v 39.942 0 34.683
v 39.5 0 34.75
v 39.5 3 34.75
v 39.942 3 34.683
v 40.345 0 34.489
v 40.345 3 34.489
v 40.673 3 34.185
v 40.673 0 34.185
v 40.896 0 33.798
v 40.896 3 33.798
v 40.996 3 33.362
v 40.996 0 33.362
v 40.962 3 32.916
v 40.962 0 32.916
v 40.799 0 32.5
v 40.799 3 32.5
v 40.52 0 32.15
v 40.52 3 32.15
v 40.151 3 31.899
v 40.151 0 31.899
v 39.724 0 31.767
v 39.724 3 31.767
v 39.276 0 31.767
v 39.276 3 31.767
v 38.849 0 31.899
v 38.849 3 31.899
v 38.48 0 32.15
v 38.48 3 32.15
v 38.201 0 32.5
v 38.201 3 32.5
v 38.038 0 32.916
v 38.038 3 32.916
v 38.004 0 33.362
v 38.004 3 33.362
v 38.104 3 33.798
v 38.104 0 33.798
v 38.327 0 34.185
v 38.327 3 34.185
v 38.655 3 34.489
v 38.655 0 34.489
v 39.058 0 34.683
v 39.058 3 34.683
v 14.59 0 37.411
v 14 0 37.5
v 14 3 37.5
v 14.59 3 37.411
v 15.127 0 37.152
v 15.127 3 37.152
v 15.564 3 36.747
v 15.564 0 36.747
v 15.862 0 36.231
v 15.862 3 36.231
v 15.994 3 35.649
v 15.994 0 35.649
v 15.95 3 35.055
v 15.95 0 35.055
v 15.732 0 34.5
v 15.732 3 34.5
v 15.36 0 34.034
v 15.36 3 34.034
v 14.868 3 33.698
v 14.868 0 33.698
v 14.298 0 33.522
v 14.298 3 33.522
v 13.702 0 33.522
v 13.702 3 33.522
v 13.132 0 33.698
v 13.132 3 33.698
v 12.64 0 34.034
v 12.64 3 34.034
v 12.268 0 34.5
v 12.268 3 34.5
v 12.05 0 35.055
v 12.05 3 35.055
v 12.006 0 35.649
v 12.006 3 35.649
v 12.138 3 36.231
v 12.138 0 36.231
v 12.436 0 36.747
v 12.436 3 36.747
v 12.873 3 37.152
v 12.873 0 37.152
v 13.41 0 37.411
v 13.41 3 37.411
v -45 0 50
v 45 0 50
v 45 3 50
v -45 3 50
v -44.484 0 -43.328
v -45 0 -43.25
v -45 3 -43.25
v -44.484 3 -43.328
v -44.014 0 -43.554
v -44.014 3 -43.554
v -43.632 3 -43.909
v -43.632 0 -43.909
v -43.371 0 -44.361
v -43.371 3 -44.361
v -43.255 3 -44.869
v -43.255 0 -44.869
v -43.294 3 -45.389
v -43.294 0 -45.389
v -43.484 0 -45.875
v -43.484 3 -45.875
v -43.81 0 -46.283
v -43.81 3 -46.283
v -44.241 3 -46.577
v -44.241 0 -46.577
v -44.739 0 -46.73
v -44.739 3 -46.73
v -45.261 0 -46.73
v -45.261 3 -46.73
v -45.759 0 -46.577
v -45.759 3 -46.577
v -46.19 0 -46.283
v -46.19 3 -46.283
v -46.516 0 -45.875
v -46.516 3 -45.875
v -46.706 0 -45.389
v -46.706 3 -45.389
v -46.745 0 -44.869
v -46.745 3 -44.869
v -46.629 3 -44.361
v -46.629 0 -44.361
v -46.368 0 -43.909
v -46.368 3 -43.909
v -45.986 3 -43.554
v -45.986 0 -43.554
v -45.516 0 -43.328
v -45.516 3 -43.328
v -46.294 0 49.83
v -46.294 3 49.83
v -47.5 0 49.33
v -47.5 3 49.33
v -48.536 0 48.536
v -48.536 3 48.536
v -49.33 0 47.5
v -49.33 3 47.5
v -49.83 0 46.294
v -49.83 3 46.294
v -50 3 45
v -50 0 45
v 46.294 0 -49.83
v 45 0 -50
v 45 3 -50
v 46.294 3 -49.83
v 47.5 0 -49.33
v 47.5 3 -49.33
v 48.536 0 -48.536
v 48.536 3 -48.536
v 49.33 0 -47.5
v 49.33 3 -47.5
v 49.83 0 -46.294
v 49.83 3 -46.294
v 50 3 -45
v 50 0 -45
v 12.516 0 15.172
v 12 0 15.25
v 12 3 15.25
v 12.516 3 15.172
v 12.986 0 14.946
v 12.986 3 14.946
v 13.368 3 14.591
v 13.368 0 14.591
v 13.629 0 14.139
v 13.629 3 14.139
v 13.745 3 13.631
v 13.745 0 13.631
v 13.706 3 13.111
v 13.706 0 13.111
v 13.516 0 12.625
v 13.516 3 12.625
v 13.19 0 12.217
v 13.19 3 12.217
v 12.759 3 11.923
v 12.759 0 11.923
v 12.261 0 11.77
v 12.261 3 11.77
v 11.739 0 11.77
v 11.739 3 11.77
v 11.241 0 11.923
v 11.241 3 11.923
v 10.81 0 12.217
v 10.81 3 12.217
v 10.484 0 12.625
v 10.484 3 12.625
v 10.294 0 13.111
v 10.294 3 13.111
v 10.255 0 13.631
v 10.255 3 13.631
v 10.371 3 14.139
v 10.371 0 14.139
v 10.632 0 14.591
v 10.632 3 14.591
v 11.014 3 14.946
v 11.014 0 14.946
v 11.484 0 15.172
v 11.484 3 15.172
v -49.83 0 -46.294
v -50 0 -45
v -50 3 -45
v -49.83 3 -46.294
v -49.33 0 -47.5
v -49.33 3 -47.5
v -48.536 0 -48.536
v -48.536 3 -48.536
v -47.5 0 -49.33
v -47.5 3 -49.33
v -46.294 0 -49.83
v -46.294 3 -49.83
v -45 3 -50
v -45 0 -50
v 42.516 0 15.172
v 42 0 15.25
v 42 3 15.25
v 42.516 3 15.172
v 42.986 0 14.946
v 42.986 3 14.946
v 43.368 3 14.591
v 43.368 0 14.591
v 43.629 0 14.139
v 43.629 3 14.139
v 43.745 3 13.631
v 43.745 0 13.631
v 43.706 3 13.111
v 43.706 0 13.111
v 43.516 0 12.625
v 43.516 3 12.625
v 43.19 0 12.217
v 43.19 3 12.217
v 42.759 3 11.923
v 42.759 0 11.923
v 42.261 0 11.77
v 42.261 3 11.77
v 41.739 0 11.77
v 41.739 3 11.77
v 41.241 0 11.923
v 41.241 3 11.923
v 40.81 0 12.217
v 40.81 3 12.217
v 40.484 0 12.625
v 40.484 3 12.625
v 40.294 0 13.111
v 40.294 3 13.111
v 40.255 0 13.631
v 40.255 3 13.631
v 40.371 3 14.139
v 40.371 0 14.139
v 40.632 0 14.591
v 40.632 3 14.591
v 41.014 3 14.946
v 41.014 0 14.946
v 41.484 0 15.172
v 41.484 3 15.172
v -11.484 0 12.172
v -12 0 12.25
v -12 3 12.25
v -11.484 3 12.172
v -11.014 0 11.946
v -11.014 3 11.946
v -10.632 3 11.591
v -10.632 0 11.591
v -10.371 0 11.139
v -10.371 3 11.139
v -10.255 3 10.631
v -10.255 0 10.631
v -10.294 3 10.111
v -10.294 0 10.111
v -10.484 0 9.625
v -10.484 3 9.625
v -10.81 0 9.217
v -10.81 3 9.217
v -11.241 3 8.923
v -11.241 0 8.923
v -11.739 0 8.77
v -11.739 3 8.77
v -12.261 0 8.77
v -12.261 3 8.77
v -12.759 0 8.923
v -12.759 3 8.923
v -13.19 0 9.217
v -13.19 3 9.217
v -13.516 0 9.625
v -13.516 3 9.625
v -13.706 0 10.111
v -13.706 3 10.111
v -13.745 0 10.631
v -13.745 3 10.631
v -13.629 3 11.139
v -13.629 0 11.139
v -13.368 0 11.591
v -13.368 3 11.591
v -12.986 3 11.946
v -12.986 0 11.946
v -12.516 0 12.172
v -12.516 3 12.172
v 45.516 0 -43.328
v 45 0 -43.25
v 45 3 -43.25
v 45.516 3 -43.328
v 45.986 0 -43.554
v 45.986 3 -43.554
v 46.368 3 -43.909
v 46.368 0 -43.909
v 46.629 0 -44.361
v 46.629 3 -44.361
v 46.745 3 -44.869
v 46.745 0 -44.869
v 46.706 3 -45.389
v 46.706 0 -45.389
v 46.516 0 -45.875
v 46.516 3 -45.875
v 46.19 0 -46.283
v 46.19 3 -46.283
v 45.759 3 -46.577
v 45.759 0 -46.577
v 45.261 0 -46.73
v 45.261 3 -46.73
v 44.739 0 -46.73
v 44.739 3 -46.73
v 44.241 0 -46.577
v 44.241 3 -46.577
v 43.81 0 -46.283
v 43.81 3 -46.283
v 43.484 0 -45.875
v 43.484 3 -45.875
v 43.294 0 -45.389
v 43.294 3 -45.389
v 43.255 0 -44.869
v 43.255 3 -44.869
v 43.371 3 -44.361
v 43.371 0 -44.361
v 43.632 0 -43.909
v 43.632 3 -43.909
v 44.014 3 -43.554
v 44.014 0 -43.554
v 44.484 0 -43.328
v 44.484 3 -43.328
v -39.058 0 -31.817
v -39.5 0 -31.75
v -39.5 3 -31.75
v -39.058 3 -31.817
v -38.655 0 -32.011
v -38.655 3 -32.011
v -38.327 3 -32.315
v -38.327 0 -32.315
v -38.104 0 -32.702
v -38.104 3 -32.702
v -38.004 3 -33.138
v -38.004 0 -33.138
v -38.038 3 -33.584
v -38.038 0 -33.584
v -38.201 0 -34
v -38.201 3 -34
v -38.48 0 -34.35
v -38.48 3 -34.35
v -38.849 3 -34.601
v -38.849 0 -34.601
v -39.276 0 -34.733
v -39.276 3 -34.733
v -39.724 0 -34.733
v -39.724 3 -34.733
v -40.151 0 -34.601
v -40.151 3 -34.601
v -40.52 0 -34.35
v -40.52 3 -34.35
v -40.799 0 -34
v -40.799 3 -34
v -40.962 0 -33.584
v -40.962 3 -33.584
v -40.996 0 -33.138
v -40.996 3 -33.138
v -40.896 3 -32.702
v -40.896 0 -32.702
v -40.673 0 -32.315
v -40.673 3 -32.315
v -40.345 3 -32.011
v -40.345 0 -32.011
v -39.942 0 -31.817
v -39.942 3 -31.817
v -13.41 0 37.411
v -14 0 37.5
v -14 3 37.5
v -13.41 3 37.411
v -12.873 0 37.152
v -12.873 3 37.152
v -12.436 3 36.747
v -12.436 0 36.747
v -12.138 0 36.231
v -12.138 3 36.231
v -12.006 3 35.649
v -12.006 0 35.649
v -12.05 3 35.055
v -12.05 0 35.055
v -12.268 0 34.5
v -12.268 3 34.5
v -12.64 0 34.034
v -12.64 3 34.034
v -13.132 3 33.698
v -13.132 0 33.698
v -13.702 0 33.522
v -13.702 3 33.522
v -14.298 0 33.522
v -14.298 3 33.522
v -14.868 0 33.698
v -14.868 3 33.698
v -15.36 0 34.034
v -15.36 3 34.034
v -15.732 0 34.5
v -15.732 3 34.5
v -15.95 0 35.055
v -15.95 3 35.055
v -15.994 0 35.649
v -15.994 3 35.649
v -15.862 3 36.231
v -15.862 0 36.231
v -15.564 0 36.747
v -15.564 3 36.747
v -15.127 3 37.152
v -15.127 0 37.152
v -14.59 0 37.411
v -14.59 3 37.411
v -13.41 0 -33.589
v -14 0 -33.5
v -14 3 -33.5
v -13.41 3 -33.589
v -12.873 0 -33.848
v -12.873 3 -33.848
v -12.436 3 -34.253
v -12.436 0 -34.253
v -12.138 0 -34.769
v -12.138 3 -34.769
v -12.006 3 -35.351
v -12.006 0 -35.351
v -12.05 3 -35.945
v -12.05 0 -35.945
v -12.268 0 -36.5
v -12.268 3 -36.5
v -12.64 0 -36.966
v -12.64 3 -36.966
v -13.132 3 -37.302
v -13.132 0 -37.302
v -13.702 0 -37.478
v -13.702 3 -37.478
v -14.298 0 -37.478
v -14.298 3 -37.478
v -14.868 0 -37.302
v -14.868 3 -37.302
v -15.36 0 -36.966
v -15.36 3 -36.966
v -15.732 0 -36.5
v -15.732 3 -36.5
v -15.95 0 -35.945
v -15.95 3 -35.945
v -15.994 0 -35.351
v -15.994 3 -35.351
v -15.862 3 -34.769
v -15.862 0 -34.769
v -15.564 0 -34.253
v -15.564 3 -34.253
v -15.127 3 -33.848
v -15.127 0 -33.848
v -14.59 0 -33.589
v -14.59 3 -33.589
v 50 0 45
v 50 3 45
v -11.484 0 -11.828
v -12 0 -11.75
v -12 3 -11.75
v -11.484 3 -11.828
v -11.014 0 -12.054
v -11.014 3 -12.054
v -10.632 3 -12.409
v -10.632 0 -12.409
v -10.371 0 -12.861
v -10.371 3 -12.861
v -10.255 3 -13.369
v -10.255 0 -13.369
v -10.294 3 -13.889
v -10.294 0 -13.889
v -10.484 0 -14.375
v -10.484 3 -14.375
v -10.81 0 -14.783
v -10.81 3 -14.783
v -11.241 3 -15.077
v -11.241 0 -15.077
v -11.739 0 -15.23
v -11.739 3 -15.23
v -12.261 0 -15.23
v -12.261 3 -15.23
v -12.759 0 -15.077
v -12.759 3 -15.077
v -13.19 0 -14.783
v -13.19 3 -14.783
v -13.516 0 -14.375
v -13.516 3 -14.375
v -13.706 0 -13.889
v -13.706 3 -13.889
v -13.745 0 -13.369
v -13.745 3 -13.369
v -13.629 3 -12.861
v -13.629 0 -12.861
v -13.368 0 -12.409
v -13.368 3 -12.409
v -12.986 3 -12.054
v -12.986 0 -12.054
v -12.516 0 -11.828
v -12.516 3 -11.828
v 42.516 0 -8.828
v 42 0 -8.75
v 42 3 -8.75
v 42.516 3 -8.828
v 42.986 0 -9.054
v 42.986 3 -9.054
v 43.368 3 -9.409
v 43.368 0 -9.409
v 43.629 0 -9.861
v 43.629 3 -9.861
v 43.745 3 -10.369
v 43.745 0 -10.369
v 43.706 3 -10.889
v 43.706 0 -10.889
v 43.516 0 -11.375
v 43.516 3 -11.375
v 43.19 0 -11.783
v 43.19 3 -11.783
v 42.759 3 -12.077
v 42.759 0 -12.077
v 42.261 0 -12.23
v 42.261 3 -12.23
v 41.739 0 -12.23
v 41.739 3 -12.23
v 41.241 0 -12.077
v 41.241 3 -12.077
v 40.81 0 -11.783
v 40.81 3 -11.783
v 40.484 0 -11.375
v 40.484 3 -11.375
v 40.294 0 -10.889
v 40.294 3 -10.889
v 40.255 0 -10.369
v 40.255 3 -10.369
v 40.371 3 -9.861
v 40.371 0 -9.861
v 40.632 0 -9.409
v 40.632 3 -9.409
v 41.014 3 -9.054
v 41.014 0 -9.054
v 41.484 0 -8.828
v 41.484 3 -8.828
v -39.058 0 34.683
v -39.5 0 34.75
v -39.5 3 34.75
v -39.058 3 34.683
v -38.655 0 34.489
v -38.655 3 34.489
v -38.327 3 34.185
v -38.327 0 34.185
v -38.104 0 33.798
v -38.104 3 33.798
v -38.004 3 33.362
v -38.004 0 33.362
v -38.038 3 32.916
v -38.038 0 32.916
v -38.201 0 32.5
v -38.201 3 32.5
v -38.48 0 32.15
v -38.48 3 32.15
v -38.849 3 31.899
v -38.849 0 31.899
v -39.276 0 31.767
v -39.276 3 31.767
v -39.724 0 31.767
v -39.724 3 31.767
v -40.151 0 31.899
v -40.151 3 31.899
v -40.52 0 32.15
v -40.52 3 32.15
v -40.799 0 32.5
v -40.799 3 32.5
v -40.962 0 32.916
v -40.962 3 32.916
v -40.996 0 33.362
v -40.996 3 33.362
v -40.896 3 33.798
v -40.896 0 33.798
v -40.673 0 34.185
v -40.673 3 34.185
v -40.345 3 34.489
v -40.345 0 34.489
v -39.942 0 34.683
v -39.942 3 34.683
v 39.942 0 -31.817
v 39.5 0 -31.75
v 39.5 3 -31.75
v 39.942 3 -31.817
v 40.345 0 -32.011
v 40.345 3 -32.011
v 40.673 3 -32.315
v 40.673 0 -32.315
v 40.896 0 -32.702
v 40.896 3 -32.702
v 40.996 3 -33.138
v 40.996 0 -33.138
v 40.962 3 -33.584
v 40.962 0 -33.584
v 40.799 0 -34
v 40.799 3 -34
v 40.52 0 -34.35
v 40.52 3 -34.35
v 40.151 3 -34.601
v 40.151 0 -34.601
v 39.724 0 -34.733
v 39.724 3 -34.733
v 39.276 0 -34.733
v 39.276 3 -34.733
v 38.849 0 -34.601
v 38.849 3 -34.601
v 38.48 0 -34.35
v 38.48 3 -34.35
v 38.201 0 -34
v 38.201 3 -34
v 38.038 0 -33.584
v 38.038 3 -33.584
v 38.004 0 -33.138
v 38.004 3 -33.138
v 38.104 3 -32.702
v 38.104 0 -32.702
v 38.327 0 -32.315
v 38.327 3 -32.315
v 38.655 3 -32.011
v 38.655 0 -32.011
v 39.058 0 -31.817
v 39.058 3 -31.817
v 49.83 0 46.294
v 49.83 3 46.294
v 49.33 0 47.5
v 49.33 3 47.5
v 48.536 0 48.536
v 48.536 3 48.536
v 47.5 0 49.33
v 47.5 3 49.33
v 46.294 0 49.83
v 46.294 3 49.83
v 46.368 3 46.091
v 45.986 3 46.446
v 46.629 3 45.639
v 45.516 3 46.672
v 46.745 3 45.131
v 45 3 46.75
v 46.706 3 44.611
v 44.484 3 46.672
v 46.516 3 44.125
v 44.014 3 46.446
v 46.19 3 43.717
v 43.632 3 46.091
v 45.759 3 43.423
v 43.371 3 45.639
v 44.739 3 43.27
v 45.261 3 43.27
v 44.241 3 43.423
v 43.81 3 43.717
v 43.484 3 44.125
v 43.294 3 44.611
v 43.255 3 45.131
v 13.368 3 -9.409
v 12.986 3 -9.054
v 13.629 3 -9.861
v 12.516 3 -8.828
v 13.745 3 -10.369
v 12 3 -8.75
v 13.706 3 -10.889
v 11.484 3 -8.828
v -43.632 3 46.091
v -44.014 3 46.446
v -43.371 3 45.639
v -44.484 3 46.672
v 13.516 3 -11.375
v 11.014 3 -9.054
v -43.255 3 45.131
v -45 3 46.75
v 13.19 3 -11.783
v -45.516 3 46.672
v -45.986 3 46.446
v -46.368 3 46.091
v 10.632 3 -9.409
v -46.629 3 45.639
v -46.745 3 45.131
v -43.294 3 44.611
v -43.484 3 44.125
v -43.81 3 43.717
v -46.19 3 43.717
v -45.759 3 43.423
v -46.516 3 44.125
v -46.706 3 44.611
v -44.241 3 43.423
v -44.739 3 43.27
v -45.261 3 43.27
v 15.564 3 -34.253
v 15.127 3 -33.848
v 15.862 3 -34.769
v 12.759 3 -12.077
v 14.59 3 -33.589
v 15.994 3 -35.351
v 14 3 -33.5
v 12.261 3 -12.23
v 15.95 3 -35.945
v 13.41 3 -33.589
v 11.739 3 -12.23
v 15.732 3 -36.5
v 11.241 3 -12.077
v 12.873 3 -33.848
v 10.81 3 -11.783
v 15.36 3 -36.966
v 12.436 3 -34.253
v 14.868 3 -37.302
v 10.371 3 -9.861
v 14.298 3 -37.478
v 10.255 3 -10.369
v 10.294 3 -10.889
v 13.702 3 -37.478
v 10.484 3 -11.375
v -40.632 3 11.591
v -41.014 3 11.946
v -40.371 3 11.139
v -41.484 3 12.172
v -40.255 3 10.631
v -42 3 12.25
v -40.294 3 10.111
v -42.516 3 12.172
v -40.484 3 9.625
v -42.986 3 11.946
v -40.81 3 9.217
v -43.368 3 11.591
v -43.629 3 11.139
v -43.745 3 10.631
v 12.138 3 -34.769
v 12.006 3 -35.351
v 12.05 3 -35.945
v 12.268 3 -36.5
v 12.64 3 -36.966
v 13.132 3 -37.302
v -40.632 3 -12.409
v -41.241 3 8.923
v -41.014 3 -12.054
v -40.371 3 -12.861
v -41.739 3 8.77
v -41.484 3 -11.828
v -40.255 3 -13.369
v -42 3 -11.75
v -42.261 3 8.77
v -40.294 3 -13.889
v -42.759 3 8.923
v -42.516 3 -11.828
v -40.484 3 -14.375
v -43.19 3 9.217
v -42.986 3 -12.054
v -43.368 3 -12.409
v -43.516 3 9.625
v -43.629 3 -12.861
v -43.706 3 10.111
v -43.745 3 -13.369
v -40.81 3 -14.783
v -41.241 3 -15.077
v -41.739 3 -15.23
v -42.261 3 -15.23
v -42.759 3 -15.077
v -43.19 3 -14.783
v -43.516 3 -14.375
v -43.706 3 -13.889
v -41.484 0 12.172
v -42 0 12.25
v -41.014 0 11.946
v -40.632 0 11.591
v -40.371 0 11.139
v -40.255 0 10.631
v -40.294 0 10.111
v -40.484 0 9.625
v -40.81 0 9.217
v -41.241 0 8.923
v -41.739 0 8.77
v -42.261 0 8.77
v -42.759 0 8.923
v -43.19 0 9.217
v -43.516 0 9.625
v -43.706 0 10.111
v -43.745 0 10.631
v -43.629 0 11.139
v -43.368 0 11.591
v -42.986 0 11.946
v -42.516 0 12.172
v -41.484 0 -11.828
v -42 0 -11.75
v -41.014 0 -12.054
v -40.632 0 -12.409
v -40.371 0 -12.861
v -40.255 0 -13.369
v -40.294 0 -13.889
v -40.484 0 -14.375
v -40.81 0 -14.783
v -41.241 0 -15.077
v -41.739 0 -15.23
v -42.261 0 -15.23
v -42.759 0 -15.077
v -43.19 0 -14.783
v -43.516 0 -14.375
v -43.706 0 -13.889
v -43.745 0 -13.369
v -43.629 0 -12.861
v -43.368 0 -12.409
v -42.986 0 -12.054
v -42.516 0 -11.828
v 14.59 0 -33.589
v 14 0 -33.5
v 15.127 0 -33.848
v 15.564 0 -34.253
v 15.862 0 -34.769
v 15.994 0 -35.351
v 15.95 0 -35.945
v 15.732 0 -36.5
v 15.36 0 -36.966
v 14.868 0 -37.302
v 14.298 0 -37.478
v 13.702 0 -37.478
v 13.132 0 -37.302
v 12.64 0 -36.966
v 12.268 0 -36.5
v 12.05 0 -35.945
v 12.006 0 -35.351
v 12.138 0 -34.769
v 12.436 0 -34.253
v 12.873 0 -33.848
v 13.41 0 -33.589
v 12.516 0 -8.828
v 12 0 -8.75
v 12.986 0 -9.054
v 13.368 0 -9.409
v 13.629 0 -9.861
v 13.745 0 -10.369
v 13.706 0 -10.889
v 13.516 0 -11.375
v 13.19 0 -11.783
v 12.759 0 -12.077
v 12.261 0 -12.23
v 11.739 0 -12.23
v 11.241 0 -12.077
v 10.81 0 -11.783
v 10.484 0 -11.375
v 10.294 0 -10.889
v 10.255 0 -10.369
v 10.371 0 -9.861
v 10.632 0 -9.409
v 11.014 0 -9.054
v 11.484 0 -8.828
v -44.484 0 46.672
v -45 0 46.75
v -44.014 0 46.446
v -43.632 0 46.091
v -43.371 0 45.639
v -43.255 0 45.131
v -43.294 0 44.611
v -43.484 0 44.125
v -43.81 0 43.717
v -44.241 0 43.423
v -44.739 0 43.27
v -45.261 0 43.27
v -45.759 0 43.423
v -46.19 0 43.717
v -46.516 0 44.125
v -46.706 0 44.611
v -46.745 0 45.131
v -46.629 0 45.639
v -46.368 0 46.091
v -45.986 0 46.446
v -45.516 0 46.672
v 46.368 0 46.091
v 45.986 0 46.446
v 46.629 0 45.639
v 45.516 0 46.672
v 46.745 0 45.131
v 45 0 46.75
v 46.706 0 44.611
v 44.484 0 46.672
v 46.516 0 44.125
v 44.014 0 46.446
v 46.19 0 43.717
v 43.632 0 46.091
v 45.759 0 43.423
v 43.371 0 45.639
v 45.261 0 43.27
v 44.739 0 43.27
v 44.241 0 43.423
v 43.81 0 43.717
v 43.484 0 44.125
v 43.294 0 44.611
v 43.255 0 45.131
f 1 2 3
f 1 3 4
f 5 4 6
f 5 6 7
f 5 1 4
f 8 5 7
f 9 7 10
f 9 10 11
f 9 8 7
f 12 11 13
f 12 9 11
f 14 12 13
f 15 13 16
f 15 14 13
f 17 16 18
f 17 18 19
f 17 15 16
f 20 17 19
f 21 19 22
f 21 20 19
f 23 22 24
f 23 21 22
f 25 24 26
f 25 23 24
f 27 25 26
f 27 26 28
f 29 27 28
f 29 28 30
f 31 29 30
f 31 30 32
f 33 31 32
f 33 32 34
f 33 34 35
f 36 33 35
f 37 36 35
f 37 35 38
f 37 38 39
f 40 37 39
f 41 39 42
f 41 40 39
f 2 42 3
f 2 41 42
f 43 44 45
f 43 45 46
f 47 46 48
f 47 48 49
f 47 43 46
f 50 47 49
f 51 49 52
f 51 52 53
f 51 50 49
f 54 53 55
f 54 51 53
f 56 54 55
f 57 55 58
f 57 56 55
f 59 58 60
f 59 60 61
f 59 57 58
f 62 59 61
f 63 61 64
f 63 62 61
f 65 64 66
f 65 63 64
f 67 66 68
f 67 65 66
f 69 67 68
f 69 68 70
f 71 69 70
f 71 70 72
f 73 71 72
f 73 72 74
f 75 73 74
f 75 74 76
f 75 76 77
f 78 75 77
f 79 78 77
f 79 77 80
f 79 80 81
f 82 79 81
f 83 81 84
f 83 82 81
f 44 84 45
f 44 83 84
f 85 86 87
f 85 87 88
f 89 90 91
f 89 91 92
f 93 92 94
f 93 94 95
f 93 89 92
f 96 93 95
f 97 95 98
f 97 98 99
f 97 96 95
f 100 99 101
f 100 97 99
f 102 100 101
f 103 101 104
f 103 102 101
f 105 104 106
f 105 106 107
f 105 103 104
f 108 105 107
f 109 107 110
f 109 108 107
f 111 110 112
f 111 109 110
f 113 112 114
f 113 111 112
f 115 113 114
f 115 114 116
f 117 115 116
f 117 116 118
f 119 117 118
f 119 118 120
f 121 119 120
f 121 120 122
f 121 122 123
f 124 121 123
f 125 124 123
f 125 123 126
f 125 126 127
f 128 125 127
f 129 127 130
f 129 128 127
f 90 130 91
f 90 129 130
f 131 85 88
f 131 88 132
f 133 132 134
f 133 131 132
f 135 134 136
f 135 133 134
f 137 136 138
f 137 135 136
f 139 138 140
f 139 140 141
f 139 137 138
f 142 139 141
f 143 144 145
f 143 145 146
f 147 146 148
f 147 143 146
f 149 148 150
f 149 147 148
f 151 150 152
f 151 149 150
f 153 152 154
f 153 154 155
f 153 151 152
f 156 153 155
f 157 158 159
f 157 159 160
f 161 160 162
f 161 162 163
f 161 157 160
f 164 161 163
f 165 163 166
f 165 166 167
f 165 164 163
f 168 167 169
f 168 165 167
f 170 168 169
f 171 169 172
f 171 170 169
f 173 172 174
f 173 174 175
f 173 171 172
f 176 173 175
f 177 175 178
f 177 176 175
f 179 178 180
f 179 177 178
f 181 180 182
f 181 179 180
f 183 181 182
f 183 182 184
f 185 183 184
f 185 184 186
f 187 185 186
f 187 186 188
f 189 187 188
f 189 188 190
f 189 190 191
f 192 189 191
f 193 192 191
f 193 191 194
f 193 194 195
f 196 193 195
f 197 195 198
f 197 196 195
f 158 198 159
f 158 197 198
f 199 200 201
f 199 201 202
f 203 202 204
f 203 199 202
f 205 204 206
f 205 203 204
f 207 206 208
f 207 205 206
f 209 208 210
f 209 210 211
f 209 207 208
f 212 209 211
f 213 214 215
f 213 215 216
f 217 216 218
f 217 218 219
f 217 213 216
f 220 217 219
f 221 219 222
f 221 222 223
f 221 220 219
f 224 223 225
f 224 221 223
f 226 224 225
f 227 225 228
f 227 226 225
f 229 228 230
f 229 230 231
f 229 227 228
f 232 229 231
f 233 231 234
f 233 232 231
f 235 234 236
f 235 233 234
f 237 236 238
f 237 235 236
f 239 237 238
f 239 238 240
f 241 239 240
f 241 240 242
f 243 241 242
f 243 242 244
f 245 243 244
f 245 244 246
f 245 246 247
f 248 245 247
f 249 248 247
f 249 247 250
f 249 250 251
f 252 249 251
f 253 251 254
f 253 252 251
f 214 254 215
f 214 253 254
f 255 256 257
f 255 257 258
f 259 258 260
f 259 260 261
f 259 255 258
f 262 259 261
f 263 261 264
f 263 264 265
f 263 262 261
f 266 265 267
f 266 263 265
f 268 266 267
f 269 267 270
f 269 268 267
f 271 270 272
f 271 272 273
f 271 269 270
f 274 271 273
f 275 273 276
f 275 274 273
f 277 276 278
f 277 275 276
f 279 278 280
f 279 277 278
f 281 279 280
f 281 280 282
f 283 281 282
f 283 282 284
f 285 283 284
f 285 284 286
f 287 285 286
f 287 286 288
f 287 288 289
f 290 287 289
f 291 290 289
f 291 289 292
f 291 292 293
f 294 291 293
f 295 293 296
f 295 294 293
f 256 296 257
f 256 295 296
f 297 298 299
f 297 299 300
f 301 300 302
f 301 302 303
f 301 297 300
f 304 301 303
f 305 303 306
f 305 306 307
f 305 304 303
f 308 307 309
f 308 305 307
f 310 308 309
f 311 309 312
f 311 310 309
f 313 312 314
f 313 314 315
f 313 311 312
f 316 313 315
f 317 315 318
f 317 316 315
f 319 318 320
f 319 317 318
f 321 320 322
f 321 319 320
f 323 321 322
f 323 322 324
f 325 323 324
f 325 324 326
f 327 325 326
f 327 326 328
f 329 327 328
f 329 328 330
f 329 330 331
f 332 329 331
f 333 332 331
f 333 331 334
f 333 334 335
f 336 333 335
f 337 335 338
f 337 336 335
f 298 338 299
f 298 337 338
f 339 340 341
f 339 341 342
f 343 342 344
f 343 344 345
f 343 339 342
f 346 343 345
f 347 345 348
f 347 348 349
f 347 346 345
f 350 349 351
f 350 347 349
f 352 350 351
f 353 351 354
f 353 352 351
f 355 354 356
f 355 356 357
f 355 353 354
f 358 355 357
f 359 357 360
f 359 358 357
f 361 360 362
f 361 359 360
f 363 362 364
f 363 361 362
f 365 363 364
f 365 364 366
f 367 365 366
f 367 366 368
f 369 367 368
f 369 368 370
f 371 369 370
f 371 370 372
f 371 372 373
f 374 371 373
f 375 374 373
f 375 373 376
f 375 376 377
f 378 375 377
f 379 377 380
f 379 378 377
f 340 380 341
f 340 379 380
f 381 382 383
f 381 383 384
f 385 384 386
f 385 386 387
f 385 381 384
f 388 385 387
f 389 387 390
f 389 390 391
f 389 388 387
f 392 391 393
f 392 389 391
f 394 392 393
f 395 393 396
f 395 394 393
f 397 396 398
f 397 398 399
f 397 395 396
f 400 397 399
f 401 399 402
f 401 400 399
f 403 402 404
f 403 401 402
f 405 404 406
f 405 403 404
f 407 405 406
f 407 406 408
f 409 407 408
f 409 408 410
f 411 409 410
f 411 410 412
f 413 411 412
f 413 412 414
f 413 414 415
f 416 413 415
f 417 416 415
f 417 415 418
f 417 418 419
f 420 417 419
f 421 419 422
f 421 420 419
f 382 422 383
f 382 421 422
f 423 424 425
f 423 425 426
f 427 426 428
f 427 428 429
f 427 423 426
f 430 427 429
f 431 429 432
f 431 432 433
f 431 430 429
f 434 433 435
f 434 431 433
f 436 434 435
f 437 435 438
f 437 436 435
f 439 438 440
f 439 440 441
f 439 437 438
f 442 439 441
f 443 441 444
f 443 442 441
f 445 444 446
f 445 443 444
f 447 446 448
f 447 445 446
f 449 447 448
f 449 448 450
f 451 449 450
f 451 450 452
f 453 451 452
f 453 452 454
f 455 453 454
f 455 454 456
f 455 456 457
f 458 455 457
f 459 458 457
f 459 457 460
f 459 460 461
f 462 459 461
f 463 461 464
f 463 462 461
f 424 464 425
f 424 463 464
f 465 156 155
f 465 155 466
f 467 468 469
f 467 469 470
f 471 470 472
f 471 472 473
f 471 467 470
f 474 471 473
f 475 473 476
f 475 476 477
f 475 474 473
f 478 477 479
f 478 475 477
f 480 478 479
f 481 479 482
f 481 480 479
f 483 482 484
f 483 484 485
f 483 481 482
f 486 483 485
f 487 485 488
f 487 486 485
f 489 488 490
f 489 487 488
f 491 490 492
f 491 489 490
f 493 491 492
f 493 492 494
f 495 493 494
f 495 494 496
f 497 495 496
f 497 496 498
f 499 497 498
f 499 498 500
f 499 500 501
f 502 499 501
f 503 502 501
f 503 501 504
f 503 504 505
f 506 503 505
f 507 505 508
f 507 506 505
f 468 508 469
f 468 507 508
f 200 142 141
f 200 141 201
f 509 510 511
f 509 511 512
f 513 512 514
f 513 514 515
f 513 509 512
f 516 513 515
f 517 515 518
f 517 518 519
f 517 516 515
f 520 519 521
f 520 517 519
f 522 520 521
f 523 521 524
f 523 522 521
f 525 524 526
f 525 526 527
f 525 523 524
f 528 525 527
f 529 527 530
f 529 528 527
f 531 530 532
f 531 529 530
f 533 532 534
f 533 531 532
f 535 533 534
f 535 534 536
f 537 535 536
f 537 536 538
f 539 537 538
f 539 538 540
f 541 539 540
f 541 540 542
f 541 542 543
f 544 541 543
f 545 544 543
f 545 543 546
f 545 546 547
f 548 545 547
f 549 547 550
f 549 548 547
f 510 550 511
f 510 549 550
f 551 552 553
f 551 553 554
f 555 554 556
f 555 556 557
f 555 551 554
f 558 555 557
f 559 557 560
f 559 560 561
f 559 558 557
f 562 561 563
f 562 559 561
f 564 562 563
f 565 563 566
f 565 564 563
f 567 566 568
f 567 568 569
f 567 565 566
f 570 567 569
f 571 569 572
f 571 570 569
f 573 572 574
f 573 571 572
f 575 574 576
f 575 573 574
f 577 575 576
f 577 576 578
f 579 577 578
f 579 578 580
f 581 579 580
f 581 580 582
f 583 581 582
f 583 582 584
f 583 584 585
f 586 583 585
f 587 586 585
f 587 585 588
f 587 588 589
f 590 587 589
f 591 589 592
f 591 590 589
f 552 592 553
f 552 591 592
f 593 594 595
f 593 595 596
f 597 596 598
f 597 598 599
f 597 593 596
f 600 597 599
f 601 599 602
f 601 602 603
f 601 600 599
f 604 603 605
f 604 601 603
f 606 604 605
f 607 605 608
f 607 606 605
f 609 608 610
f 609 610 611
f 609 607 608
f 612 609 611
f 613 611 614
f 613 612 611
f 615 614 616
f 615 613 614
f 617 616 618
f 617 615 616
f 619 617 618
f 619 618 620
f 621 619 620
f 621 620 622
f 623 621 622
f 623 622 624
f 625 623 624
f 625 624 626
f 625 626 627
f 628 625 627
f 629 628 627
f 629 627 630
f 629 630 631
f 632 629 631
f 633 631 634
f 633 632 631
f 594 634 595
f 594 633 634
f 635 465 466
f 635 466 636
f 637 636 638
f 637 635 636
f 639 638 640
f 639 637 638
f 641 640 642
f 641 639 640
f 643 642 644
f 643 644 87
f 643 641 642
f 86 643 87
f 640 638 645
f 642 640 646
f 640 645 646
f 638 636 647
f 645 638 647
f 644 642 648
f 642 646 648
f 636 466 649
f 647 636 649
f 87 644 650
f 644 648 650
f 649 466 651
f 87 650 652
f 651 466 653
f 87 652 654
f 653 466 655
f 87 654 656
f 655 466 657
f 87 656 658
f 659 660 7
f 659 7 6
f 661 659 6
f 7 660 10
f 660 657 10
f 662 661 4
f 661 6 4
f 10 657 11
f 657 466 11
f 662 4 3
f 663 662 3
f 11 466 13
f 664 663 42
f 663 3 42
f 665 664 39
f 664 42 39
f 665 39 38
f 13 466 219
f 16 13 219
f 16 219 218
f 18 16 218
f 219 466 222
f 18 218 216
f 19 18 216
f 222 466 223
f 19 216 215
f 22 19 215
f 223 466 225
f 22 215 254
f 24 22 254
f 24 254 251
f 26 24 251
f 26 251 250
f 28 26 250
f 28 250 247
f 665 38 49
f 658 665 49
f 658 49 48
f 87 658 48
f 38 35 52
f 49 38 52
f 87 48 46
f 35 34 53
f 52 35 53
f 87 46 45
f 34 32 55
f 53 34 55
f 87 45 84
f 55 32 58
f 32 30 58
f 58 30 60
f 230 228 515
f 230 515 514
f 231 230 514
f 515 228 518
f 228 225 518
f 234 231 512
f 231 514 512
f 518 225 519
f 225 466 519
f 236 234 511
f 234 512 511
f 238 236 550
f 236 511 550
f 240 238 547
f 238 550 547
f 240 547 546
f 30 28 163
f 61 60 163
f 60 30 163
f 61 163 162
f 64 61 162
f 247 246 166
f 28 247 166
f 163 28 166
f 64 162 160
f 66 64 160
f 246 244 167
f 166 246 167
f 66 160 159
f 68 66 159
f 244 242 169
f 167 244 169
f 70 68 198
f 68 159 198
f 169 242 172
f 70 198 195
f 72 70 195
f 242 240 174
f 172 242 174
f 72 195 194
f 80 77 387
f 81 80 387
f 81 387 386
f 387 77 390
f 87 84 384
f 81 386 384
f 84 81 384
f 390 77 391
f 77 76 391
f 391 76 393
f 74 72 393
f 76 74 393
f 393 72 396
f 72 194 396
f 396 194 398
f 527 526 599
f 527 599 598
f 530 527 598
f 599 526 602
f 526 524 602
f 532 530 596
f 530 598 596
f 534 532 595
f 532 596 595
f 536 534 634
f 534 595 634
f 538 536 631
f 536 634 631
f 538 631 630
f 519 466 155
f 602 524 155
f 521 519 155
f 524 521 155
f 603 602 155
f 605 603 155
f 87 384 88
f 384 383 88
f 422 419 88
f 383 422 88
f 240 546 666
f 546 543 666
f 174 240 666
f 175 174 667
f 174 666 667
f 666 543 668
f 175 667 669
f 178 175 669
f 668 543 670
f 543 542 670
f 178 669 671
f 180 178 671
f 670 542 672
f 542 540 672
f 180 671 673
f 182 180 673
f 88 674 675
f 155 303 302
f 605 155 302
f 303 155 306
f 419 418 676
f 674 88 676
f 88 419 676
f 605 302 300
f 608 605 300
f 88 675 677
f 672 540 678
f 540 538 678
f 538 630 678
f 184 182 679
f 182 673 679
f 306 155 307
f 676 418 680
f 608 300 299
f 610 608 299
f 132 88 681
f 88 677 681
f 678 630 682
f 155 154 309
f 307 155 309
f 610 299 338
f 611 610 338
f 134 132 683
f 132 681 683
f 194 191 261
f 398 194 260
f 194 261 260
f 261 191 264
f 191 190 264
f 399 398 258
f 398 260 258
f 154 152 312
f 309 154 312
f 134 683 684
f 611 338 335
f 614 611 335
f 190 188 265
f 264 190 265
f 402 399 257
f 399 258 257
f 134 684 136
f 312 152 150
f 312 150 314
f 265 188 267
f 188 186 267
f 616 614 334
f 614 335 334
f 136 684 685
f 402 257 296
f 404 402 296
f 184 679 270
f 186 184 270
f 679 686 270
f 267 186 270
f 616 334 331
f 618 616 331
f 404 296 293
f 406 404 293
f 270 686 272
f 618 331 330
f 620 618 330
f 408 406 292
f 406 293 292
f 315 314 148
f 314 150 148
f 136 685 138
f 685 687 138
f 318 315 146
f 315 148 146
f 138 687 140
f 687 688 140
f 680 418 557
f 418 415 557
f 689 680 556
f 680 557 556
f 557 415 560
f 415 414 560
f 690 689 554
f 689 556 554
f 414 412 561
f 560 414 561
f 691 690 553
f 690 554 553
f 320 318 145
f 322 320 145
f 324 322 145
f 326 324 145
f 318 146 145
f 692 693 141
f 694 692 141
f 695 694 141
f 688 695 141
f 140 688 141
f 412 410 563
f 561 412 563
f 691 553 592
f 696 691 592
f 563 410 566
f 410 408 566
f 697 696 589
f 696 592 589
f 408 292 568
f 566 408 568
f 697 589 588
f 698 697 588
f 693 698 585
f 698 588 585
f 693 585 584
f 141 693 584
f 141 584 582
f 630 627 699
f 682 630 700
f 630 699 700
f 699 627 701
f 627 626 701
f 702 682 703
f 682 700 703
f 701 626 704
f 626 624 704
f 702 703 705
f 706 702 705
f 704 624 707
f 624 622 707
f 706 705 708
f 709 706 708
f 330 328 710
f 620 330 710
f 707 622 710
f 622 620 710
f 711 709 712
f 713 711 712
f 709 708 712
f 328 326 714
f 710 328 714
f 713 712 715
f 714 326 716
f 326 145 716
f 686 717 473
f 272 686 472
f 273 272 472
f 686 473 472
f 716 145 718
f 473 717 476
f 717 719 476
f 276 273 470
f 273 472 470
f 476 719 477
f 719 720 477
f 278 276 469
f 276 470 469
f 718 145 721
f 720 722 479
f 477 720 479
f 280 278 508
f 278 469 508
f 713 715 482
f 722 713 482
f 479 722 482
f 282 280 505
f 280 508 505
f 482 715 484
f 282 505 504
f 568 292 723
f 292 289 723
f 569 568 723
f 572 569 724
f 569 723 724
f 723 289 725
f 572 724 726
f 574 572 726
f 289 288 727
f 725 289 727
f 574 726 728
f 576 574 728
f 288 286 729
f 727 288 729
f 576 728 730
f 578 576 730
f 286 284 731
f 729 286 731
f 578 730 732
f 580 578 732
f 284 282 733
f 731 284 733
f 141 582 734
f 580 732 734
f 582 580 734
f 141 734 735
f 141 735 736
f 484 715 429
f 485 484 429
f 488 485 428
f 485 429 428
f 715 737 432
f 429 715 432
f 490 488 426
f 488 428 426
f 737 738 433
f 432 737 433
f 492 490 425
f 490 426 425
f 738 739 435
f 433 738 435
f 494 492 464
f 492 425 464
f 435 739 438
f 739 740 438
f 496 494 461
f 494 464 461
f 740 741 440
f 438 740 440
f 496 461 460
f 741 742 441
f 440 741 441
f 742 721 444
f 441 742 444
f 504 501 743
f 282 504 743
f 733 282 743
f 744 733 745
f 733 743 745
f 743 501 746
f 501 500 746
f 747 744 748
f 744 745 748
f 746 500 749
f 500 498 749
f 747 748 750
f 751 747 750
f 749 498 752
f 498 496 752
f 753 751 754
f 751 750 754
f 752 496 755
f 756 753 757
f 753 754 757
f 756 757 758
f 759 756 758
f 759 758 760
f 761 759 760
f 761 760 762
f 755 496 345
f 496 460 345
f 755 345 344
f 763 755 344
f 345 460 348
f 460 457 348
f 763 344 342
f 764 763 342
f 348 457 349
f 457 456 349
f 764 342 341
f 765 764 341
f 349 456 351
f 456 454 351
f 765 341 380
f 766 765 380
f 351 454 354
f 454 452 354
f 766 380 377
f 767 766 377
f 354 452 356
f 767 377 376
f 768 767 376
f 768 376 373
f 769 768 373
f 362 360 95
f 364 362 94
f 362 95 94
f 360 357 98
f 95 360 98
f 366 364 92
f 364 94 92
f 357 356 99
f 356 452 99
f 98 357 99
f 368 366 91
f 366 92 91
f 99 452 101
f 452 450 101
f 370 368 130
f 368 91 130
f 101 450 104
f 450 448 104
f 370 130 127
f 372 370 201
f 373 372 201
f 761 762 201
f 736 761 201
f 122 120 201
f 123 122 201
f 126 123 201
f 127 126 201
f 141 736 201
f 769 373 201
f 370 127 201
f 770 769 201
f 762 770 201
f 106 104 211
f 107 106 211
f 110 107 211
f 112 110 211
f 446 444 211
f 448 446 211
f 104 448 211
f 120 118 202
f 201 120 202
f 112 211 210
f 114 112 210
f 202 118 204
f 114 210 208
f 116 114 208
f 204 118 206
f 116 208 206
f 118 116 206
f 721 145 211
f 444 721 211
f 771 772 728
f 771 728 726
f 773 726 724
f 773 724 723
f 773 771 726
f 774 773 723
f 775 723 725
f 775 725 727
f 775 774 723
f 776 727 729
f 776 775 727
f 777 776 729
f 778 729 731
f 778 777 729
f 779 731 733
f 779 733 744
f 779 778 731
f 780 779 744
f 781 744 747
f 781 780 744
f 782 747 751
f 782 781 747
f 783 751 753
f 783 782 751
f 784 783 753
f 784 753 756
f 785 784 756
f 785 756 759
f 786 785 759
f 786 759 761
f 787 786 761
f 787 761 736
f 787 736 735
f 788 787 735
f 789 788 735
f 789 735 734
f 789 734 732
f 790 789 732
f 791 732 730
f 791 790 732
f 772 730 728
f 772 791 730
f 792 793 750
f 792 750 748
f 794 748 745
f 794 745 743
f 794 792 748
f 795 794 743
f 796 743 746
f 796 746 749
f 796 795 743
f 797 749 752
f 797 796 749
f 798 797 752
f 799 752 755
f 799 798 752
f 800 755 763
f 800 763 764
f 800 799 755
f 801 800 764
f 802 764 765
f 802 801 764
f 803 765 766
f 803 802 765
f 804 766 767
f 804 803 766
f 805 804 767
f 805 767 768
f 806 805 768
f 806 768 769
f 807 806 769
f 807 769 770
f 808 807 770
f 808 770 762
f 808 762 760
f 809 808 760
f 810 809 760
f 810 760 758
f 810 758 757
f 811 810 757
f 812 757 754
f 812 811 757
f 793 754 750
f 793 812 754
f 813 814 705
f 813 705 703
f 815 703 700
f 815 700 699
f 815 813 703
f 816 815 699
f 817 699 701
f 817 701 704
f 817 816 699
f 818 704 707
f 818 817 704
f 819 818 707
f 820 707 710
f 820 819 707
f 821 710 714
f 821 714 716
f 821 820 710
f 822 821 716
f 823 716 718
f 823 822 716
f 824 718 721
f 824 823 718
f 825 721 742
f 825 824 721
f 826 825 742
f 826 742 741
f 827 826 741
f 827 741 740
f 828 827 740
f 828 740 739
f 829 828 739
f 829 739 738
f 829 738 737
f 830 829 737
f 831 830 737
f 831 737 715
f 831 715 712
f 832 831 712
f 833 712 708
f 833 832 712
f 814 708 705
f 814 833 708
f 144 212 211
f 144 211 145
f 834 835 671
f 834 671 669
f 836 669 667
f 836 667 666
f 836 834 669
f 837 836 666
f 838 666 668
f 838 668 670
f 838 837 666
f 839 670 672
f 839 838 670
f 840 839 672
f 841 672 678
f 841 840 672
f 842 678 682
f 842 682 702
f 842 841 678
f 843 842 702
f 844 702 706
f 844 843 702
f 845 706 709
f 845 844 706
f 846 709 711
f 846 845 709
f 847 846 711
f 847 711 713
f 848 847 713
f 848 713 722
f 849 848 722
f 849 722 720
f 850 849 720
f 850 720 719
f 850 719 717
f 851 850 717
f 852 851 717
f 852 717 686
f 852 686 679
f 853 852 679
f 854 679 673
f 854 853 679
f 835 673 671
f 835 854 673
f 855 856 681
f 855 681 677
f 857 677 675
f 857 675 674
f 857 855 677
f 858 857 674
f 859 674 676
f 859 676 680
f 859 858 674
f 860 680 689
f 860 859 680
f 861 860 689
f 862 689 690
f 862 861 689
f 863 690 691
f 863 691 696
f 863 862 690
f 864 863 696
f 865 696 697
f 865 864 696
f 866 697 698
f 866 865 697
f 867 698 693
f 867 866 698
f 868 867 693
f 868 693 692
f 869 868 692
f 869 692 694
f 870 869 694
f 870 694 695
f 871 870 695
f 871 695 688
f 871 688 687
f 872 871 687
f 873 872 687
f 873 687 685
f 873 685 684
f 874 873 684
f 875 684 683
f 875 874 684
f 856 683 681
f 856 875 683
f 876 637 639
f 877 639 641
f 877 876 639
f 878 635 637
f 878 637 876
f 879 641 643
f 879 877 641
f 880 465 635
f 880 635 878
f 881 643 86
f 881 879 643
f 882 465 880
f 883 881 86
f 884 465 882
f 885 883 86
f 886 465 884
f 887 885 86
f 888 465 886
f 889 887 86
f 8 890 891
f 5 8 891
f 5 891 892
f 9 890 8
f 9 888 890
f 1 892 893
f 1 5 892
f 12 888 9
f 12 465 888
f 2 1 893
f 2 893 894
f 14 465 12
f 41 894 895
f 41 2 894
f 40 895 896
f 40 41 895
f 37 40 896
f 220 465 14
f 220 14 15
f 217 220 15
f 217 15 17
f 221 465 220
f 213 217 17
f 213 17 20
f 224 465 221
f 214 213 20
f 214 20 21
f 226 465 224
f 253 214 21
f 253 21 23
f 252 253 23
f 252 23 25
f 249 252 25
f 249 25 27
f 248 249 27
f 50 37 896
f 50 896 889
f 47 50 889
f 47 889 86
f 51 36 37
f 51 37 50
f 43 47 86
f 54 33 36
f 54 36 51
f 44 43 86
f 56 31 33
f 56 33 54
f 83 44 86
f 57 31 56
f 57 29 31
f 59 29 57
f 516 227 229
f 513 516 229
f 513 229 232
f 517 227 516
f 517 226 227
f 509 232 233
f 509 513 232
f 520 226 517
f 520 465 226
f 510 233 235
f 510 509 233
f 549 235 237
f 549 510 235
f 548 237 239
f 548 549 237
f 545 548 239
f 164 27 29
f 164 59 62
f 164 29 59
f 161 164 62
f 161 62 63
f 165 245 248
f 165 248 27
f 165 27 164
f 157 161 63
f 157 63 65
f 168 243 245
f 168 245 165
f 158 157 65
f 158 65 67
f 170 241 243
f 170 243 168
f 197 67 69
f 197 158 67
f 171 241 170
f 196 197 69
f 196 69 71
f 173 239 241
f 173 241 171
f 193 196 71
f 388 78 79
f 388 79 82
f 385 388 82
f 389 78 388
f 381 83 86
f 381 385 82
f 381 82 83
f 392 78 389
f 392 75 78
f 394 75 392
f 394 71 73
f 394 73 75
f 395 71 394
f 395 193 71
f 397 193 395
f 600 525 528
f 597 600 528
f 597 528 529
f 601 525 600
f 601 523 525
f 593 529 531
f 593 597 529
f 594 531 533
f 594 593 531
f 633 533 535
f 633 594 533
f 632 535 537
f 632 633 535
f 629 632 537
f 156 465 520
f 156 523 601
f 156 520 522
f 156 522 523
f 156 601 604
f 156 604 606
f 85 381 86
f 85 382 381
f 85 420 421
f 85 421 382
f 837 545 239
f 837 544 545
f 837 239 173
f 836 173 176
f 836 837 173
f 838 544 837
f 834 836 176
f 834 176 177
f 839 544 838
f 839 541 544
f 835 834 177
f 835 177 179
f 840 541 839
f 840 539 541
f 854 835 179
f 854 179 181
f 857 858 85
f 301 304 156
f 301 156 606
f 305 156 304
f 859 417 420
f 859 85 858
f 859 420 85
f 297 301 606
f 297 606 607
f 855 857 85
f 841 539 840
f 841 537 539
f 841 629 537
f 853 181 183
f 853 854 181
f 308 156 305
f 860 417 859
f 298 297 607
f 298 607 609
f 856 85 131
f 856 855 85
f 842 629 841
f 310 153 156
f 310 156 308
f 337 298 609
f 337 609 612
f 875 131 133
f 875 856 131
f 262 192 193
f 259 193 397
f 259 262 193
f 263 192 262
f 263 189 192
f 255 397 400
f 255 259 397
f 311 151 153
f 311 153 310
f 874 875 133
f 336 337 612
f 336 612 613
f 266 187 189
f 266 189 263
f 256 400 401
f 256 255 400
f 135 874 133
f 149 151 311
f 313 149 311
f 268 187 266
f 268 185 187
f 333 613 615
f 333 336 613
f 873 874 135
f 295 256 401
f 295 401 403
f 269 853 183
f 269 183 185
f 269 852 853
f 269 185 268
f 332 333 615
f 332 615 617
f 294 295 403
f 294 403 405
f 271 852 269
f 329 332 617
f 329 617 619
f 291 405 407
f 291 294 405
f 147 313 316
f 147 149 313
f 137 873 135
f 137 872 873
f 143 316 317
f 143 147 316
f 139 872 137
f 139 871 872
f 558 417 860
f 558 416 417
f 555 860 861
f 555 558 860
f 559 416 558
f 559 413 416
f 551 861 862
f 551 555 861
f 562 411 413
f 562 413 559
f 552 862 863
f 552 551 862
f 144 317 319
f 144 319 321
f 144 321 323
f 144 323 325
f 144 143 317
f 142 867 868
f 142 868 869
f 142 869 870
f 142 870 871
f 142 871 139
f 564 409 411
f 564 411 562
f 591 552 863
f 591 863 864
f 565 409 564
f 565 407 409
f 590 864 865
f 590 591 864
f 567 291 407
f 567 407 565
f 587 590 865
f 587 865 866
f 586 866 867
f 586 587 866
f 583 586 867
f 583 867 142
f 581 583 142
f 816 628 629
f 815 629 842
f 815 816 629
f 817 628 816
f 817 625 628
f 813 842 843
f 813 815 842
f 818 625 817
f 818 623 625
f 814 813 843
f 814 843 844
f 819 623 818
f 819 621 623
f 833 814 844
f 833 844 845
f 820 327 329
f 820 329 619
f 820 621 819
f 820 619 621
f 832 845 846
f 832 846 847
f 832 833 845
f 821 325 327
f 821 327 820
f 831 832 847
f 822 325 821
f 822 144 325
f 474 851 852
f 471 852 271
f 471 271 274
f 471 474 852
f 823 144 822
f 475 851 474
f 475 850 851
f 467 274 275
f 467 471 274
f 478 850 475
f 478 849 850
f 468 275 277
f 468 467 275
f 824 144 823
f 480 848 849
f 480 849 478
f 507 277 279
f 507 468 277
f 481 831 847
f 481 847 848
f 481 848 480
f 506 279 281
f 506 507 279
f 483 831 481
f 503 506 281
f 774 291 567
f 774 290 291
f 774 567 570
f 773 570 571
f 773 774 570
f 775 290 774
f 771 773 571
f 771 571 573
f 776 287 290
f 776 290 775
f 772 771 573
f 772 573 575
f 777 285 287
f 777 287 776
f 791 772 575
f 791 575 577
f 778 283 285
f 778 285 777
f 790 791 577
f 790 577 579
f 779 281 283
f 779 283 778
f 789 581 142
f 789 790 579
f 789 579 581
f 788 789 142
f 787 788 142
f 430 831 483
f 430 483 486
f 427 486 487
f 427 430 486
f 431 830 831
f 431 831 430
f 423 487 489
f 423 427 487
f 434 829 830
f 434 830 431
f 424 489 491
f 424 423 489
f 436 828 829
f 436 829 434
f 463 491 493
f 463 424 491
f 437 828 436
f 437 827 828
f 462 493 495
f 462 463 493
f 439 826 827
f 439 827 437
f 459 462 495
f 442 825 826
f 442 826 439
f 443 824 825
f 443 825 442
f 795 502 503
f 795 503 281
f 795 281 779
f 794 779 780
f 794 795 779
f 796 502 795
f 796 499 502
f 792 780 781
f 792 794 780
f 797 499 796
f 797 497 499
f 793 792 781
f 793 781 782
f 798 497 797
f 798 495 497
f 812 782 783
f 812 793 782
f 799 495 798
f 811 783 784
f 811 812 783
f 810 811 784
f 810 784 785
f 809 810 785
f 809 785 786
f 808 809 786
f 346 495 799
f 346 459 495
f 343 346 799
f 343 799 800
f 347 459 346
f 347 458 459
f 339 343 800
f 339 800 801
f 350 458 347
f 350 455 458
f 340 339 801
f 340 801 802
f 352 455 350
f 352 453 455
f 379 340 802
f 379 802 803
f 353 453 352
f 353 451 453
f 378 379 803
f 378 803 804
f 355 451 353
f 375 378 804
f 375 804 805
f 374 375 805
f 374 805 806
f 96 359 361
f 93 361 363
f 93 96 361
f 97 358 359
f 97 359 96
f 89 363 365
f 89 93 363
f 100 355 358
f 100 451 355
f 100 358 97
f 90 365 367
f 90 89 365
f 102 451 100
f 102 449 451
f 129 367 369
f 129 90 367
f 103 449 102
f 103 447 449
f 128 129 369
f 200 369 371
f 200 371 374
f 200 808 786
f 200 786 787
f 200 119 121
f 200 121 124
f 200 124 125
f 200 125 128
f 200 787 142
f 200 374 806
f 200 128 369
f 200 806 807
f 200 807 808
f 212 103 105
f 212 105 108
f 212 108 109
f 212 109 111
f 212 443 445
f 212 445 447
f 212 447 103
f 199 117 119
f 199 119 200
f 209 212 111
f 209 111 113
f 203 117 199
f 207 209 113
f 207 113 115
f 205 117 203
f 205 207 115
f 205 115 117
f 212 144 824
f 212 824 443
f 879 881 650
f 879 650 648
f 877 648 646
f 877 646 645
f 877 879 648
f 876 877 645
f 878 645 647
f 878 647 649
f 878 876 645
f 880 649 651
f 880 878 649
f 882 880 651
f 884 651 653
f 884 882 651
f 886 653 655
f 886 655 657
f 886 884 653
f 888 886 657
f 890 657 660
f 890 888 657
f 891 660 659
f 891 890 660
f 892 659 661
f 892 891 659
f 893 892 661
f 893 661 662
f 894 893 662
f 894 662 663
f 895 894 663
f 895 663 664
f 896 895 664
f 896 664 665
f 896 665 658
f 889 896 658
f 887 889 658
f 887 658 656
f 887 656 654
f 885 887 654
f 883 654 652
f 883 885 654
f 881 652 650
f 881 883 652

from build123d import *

# Parameters (mm, degrees)
SKETCH_1_R      = 1.75
SKETCH_1_R_2    = 2
SKETCH_1_R_3    = 1.5
EXTRUDE_1_DEPTH = 3


with BuildPart() as part:
    # 草图1 → 凸台-拉伸1 (new body)
    with BuildSketch(Plane(origin=(0, 0, 0), x_dir=(1, 0, 0), z_dir=(0, 1, 0))):
        with BuildLine():
            Line((-45, 50), (45, 50))
            ThreePointArc((45, 50), (48.535533906, 48.535533906), (50, 45))
            Line((50, 45), (50, -45))
            ThreePointArc((50, -45), (48.535533906, -48.535533906), (45, -50))
            Line((45, -50), (-45, -50))
            ThreePointArc((-45, -50), (-48.535533906, -48.535533906), (-50, -45))
            Line((-50, -45), (-50, 45))
            ThreePointArc((-50, 45), (-48.535533906, 48.535533906), (-45, 50))
        make_face()
        with Locations(Location((-45, 45, 0), (0, 0, 270))):
            Circle(SKETCH_1_R, mode=Mode.SUBTRACT)
        with Locations(Location((45, 45, 0), (0, 0, 270))):
            Circle(SKETCH_1_R, mode=Mode.SUBTRACT)
        with Locations(Location((-45, -45, 0), (0, 0, 270))):
            Circle(SKETCH_1_R, mode=Mode.SUBTRACT)
        with Locations(Location((45, -45, 0), (0, 0, 270))):
            Circle(SKETCH_1_R, mode=Mode.SUBTRACT)
        with Locations(Location((12, 10.5, 0), (0, 0, 270))):
            Circle(SKETCH_1_R, mode=Mode.SUBTRACT)
        with Locations(Location((42, 10.5, 0), (0, 0, 270))):
            Circle(SKETCH_1_R, mode=Mode.SUBTRACT)
        with Locations(Location((12, -13.5, 0), (0, 0, 270))):
            Circle(SKETCH_1_R, mode=Mode.SUBTRACT)
        with Locations(Location((42, -13.5, 0), (0, 0, 270))):
            Circle(SKETCH_1_R, mode=Mode.SUBTRACT)
        with Locations(Location((-42, 13.5, 0), (0, 0, 270))):
            Circle(SKETCH_1_R, mode=Mode.SUBTRACT)
        with Locations(Location((-12, 13.5, 0), (0, 0, 270))):
            Circle(SKETCH_1_R, mode=Mode.SUBTRACT)
        with Locations(Location((-42, -10.5, 0), (0, 0, 270))):
            Circle(SKETCH_1_R, mode=Mode.SUBTRACT)
        with Locations(Location((-12, -10.5, 0), (0, 0, 270))):
            Circle(SKETCH_1_R, mode=Mode.SUBTRACT)
        with Locations(Location((-14, -35.5, 0), (0, 0, 270))):
            Circle(SKETCH_1_R_2, mode=Mode.SUBTRACT)
        with Locations(Location((14, -35.5, 0), (0, 0, 270))):
            Circle(SKETCH_1_R_2, mode=Mode.SUBTRACT)
        with Locations(Location((-14, 35.5, 0), (0, 0, 270))):
            Circle(SKETCH_1_R_2, mode=Mode.SUBTRACT)
        with Locations(Location((14, 35.5, 0), (0, 0, 270))):
            Circle(SKETCH_1_R_2, mode=Mode.SUBTRACT)
        with Locations(Location((-39.5, 33.25, 0), (0, 0, 270))):
            Circle(SKETCH_1_R_3, mode=Mode.SUBTRACT)
        with Locations(Location((39.5, 33.25, 0), (0, 0, 270))):
            Circle(SKETCH_1_R_3, mode=Mode.SUBTRACT)
        with Locations(Location((-39.5, -33.25, 0), (0, 0, 270))):
            Circle(SKETCH_1_R_3, mode=Mode.SUBTRACT)
        with Locations(Location((39.5, -33.25, 0), (0, 0, 270))):
            Circle(SKETCH_1_R_3, mode=Mode.SUBTRACT)
    extrude(amount=EXTRUDE_1_DEPTH)


solid = part.part
